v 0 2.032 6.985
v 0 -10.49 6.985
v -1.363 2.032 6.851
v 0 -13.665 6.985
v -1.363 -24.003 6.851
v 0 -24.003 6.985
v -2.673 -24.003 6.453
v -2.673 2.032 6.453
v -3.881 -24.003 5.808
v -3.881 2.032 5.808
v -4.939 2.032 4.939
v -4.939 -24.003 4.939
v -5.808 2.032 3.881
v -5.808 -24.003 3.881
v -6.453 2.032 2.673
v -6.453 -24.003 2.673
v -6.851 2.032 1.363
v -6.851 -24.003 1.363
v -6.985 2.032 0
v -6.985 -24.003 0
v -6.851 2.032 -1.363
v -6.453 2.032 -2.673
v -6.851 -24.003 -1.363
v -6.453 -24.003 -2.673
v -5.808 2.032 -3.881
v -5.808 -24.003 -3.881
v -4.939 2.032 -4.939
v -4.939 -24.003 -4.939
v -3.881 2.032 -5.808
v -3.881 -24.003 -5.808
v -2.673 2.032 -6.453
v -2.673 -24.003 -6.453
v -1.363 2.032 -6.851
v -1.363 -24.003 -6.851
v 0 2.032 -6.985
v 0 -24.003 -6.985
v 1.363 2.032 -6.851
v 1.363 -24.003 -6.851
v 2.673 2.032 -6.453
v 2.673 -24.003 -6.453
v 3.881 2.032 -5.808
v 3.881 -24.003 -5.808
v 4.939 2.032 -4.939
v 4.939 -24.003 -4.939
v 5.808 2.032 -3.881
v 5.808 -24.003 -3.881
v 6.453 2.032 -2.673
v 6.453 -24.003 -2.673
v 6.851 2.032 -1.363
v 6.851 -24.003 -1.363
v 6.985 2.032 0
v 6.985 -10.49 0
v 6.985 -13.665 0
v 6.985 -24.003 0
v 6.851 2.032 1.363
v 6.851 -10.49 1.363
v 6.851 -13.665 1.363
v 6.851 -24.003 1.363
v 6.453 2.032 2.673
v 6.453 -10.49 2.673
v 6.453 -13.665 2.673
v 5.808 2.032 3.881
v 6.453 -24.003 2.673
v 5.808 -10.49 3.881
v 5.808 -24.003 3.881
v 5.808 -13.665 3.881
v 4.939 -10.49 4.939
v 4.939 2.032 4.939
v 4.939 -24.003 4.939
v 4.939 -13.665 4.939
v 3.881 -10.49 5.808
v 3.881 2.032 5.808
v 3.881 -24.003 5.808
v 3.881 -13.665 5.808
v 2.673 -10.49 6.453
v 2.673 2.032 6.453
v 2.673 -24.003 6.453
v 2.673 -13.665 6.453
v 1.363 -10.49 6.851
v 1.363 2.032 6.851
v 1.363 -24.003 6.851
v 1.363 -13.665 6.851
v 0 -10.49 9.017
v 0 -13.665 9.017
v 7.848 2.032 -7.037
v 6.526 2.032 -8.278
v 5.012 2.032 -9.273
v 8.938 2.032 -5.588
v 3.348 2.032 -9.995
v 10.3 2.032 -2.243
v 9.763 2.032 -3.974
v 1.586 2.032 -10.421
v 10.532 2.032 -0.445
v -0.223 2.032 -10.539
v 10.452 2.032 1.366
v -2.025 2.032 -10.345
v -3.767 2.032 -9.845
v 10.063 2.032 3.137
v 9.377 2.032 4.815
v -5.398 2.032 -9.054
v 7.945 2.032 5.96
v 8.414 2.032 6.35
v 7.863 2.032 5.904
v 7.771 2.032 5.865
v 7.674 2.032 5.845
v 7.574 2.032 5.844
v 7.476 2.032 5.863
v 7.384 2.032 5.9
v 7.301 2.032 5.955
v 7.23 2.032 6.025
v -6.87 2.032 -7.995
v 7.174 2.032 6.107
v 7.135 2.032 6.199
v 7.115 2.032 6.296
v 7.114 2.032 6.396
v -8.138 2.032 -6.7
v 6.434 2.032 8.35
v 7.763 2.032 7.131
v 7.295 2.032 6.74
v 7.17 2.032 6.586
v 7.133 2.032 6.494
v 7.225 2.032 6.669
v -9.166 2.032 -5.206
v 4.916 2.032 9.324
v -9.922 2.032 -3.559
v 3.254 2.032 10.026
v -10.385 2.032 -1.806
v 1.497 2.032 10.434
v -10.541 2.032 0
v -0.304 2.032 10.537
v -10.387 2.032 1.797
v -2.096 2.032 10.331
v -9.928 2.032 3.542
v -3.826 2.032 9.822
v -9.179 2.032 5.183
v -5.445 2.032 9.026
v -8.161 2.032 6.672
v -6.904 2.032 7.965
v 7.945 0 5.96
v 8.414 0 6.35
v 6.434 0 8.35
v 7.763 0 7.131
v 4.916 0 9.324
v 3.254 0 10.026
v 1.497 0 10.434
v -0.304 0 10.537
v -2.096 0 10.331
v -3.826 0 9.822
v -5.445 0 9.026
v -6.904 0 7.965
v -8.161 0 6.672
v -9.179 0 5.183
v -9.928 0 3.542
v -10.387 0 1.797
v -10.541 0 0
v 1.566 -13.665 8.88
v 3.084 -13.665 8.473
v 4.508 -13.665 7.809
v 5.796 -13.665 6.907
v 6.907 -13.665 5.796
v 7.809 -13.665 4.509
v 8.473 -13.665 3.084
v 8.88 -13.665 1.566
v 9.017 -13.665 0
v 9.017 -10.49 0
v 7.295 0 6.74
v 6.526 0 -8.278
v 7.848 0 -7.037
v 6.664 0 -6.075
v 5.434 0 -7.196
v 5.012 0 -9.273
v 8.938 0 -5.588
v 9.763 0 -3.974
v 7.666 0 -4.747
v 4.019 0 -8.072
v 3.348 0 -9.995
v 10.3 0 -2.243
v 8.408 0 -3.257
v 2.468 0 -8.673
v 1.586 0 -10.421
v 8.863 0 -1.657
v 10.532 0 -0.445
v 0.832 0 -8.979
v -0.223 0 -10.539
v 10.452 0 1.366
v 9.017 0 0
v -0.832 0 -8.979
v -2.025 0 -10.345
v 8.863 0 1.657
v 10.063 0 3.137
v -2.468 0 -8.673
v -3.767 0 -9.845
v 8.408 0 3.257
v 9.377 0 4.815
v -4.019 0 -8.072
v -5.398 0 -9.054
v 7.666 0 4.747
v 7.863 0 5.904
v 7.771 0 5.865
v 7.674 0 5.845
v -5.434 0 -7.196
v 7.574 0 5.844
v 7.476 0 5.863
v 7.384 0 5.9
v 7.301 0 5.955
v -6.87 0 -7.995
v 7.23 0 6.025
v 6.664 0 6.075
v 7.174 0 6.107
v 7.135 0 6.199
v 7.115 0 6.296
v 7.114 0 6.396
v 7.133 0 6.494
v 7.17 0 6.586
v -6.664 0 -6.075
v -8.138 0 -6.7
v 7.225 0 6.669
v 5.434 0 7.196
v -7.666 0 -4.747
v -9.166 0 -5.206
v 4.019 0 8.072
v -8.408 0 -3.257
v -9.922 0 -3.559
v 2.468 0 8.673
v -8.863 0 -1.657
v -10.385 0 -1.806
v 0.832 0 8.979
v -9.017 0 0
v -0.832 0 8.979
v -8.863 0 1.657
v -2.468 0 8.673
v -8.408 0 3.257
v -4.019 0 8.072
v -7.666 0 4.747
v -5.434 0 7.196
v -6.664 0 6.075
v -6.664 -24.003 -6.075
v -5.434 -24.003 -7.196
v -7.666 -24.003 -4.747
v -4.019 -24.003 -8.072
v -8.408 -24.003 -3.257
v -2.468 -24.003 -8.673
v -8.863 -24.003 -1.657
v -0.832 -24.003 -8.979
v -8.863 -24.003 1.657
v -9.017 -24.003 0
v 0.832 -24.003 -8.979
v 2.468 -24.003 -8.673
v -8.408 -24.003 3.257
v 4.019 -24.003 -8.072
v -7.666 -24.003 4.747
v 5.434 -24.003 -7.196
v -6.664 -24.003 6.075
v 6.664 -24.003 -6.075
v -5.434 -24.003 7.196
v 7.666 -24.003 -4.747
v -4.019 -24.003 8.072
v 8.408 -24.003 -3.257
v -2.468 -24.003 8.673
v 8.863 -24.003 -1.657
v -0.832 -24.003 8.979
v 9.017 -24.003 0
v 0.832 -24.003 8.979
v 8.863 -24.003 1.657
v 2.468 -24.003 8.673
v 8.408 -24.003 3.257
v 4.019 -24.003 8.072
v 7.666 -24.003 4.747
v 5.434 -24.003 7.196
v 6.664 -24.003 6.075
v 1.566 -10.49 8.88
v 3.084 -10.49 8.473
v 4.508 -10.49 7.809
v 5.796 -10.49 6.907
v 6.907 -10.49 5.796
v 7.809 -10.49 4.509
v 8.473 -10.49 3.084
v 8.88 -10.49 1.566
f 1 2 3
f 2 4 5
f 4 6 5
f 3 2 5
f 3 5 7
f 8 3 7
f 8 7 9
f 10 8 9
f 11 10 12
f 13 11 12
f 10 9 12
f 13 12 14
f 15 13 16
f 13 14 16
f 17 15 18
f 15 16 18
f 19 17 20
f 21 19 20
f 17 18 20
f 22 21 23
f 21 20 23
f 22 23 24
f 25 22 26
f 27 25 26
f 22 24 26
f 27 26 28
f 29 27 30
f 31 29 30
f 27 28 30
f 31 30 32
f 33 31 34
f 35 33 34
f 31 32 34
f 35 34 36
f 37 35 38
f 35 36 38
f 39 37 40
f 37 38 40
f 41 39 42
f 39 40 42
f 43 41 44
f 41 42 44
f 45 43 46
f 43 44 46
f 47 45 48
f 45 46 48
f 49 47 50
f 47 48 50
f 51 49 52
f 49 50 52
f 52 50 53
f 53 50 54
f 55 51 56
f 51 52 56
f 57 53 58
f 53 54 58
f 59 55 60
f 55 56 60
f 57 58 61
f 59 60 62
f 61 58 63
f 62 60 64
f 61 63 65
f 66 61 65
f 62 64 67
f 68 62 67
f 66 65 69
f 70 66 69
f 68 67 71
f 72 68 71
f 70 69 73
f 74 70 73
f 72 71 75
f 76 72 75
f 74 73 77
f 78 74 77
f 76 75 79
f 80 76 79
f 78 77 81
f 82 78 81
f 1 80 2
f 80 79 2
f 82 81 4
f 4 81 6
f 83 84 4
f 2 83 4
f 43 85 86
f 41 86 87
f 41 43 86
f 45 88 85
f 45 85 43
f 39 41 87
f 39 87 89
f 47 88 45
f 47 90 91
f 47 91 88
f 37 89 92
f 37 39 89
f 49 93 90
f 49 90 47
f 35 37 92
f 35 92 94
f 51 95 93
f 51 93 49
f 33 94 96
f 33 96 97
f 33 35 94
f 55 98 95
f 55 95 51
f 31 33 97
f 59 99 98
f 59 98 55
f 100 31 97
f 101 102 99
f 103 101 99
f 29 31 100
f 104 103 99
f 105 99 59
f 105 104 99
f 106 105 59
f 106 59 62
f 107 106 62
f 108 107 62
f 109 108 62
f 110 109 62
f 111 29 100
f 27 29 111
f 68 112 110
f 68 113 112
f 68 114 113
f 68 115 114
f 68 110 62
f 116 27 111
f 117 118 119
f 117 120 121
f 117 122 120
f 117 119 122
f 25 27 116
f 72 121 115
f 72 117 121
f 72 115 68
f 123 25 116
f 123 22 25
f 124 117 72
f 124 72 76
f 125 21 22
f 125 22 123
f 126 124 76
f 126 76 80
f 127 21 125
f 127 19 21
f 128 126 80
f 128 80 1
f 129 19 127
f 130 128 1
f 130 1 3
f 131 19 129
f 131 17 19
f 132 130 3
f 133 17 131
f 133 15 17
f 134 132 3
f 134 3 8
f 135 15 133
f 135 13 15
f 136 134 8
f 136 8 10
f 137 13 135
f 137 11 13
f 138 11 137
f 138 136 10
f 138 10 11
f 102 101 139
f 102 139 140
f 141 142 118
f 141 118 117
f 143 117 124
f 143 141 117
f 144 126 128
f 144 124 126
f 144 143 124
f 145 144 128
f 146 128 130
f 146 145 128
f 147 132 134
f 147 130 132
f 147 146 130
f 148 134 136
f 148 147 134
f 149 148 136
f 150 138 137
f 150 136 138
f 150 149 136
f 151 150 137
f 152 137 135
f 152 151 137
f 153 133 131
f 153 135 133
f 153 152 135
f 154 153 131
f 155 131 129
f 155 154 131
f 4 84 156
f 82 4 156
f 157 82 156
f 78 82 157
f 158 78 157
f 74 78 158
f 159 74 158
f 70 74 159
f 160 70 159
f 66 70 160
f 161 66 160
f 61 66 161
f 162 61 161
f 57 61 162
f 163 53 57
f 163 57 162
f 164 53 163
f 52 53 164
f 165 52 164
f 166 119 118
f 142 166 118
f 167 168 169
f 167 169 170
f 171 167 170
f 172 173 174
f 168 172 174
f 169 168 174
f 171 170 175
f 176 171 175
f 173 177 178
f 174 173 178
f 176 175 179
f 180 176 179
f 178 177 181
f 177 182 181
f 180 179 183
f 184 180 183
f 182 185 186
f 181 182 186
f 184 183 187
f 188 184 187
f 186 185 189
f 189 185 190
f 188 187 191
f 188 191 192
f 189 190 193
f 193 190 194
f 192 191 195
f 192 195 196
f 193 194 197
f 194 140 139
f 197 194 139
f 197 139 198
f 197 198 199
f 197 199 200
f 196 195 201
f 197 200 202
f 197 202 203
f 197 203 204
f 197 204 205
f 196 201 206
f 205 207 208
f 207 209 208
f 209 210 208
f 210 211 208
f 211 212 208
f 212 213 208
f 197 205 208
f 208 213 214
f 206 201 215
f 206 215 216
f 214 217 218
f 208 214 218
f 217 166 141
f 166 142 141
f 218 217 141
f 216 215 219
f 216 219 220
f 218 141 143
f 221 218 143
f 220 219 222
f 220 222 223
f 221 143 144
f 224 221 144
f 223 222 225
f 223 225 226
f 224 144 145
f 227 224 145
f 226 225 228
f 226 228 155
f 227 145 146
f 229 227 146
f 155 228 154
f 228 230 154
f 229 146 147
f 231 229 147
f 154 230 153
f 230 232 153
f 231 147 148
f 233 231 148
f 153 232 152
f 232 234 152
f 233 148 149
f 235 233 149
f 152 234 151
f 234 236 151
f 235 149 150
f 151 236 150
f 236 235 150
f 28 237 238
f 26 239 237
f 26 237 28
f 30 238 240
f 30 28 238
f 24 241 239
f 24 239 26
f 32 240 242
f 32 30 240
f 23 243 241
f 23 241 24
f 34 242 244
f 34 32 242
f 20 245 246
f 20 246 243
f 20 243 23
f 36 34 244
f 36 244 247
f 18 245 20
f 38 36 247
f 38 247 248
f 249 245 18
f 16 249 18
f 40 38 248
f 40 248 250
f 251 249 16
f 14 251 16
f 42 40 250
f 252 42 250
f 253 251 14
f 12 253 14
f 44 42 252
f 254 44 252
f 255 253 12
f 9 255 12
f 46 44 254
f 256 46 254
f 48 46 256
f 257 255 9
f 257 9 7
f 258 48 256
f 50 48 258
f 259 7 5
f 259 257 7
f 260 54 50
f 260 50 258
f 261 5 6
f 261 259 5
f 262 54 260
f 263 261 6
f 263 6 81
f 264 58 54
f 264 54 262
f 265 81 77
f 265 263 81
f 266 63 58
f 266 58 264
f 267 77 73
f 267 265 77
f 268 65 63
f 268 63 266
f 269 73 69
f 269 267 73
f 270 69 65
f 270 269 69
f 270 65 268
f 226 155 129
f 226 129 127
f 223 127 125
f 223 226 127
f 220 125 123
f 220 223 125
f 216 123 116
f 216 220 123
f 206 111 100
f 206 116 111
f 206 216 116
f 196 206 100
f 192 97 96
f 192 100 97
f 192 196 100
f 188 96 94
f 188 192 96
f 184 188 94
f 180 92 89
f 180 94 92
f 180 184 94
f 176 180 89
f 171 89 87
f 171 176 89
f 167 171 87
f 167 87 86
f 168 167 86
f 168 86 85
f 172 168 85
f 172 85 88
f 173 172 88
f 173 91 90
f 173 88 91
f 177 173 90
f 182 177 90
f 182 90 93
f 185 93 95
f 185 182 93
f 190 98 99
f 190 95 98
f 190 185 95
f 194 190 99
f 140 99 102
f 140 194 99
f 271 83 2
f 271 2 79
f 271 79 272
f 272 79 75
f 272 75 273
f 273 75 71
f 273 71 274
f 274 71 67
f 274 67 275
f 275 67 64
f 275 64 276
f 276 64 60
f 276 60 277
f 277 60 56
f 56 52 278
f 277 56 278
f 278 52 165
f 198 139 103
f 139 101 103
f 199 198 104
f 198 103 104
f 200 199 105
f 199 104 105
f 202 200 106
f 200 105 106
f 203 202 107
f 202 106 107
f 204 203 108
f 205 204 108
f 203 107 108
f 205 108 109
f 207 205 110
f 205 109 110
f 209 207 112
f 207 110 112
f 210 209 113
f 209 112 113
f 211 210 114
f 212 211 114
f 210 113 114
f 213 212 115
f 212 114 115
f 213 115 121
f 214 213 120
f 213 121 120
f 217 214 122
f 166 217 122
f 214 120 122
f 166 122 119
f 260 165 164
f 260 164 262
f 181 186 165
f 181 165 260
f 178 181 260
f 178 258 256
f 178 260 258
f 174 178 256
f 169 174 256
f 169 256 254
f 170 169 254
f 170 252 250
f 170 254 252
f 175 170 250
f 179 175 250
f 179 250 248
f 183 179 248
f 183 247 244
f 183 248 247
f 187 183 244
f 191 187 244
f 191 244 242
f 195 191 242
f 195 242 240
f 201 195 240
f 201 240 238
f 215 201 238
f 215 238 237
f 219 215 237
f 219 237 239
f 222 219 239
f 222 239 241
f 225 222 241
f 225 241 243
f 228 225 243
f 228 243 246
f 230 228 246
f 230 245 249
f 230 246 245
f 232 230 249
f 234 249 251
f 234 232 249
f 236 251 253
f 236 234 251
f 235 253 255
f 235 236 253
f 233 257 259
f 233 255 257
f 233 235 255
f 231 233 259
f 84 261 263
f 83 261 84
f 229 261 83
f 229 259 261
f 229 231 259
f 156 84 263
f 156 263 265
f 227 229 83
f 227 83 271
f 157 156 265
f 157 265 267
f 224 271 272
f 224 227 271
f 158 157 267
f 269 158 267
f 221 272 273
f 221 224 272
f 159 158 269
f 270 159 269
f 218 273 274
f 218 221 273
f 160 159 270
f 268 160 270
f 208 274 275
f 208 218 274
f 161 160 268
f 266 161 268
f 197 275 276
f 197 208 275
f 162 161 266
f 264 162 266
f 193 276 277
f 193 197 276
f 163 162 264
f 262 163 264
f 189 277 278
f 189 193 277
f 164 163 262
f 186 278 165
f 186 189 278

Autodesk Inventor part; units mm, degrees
ref_plane "YZ Plane" through (0, 0, 0) normal (1, 0, 0) x (0, 1, 0)
ref_plane "XZ Plane" through (0, 0, 0) normal (0, 1, 0) x (-1, 0, 0)
ref_plane "XY Plane" through (0, 0, 0) normal (0, 0, 1) x (1, 0, 0)
sketch "Sketch1" plane through (0, 0, 0) normal (0, 1, 0) x (-1, 0, 0)
  circle A0 centre (0, 0) radius 10.541
  dimension "d2" = 21.082
extrude "Extrusion1" add sketch "Sketch1" along normal blind 2.032
sketch "Sketch2" plane through (0, 0, 0) normal (0, -1, 0) x (1, 0, 0)
  circle A0 centre (0, 0) radius 10.541 projected
  circle A1 centre (0, 0) radius 9.017
  dimension "d4" = 18.034
extrude "Extrusion2" add sketch "Sketch2" along normal blind 24.003 contours A1
hole "Hole1" at (0, 2.032, 0) direction (0, -1, 0) diameter 13.97 end through all
ref_plane "Work Plane1" through (0, -13.6652, 0) normal (0, 1, 0) x (1, 0, 0)
sketch "Sketch3" plane through (0, -13.6652, 0) normal (0, 1, 0) x (1, 0, 0)
  line L0 (0, 0) -> (9.017, 0)
  line L1 (9.017, 0) -> (9.017, -9.017)
  line L2 (9.017, -9.017) -> (0, -9.017)
  line L3 (0, -9.017) -> (0, 0)
  dimension "d17" = 9.017
  dimension "d18" = 9.017
extrude "Extrusion3" cut sketch "Sketch3" along normal blind 3.175
sketch "Sketch4" plane through (0, 2.032, 0) normal (0, 1, 0) x (1, 0, 0)
  circle A0 centre (0, 0) radius 10.541 projected
  circle A1 centre (7.62, -6.35) radius 0.508
  line L0 (7.62, -6.35) -> (0, 0) construction
  line L1 (7.9452, -5.9597) -> (8.4136, -6.3501)
  line L2 (7.2948, -6.7403) -> (7.7632, -7.1306)
  dimension "d21" = 1.016
  dimension "d22" = 6.35
  dimension "d23" = 7.62
extrude "Extrusion4" cut sketch "Sketch4" against normal up to surface (2.032 mm away) contours L2 A1 L1 A0 | A1 picked at (8.2446, -6.4771)
properties part number "Piston Shaft" material "Stainless Steel"
